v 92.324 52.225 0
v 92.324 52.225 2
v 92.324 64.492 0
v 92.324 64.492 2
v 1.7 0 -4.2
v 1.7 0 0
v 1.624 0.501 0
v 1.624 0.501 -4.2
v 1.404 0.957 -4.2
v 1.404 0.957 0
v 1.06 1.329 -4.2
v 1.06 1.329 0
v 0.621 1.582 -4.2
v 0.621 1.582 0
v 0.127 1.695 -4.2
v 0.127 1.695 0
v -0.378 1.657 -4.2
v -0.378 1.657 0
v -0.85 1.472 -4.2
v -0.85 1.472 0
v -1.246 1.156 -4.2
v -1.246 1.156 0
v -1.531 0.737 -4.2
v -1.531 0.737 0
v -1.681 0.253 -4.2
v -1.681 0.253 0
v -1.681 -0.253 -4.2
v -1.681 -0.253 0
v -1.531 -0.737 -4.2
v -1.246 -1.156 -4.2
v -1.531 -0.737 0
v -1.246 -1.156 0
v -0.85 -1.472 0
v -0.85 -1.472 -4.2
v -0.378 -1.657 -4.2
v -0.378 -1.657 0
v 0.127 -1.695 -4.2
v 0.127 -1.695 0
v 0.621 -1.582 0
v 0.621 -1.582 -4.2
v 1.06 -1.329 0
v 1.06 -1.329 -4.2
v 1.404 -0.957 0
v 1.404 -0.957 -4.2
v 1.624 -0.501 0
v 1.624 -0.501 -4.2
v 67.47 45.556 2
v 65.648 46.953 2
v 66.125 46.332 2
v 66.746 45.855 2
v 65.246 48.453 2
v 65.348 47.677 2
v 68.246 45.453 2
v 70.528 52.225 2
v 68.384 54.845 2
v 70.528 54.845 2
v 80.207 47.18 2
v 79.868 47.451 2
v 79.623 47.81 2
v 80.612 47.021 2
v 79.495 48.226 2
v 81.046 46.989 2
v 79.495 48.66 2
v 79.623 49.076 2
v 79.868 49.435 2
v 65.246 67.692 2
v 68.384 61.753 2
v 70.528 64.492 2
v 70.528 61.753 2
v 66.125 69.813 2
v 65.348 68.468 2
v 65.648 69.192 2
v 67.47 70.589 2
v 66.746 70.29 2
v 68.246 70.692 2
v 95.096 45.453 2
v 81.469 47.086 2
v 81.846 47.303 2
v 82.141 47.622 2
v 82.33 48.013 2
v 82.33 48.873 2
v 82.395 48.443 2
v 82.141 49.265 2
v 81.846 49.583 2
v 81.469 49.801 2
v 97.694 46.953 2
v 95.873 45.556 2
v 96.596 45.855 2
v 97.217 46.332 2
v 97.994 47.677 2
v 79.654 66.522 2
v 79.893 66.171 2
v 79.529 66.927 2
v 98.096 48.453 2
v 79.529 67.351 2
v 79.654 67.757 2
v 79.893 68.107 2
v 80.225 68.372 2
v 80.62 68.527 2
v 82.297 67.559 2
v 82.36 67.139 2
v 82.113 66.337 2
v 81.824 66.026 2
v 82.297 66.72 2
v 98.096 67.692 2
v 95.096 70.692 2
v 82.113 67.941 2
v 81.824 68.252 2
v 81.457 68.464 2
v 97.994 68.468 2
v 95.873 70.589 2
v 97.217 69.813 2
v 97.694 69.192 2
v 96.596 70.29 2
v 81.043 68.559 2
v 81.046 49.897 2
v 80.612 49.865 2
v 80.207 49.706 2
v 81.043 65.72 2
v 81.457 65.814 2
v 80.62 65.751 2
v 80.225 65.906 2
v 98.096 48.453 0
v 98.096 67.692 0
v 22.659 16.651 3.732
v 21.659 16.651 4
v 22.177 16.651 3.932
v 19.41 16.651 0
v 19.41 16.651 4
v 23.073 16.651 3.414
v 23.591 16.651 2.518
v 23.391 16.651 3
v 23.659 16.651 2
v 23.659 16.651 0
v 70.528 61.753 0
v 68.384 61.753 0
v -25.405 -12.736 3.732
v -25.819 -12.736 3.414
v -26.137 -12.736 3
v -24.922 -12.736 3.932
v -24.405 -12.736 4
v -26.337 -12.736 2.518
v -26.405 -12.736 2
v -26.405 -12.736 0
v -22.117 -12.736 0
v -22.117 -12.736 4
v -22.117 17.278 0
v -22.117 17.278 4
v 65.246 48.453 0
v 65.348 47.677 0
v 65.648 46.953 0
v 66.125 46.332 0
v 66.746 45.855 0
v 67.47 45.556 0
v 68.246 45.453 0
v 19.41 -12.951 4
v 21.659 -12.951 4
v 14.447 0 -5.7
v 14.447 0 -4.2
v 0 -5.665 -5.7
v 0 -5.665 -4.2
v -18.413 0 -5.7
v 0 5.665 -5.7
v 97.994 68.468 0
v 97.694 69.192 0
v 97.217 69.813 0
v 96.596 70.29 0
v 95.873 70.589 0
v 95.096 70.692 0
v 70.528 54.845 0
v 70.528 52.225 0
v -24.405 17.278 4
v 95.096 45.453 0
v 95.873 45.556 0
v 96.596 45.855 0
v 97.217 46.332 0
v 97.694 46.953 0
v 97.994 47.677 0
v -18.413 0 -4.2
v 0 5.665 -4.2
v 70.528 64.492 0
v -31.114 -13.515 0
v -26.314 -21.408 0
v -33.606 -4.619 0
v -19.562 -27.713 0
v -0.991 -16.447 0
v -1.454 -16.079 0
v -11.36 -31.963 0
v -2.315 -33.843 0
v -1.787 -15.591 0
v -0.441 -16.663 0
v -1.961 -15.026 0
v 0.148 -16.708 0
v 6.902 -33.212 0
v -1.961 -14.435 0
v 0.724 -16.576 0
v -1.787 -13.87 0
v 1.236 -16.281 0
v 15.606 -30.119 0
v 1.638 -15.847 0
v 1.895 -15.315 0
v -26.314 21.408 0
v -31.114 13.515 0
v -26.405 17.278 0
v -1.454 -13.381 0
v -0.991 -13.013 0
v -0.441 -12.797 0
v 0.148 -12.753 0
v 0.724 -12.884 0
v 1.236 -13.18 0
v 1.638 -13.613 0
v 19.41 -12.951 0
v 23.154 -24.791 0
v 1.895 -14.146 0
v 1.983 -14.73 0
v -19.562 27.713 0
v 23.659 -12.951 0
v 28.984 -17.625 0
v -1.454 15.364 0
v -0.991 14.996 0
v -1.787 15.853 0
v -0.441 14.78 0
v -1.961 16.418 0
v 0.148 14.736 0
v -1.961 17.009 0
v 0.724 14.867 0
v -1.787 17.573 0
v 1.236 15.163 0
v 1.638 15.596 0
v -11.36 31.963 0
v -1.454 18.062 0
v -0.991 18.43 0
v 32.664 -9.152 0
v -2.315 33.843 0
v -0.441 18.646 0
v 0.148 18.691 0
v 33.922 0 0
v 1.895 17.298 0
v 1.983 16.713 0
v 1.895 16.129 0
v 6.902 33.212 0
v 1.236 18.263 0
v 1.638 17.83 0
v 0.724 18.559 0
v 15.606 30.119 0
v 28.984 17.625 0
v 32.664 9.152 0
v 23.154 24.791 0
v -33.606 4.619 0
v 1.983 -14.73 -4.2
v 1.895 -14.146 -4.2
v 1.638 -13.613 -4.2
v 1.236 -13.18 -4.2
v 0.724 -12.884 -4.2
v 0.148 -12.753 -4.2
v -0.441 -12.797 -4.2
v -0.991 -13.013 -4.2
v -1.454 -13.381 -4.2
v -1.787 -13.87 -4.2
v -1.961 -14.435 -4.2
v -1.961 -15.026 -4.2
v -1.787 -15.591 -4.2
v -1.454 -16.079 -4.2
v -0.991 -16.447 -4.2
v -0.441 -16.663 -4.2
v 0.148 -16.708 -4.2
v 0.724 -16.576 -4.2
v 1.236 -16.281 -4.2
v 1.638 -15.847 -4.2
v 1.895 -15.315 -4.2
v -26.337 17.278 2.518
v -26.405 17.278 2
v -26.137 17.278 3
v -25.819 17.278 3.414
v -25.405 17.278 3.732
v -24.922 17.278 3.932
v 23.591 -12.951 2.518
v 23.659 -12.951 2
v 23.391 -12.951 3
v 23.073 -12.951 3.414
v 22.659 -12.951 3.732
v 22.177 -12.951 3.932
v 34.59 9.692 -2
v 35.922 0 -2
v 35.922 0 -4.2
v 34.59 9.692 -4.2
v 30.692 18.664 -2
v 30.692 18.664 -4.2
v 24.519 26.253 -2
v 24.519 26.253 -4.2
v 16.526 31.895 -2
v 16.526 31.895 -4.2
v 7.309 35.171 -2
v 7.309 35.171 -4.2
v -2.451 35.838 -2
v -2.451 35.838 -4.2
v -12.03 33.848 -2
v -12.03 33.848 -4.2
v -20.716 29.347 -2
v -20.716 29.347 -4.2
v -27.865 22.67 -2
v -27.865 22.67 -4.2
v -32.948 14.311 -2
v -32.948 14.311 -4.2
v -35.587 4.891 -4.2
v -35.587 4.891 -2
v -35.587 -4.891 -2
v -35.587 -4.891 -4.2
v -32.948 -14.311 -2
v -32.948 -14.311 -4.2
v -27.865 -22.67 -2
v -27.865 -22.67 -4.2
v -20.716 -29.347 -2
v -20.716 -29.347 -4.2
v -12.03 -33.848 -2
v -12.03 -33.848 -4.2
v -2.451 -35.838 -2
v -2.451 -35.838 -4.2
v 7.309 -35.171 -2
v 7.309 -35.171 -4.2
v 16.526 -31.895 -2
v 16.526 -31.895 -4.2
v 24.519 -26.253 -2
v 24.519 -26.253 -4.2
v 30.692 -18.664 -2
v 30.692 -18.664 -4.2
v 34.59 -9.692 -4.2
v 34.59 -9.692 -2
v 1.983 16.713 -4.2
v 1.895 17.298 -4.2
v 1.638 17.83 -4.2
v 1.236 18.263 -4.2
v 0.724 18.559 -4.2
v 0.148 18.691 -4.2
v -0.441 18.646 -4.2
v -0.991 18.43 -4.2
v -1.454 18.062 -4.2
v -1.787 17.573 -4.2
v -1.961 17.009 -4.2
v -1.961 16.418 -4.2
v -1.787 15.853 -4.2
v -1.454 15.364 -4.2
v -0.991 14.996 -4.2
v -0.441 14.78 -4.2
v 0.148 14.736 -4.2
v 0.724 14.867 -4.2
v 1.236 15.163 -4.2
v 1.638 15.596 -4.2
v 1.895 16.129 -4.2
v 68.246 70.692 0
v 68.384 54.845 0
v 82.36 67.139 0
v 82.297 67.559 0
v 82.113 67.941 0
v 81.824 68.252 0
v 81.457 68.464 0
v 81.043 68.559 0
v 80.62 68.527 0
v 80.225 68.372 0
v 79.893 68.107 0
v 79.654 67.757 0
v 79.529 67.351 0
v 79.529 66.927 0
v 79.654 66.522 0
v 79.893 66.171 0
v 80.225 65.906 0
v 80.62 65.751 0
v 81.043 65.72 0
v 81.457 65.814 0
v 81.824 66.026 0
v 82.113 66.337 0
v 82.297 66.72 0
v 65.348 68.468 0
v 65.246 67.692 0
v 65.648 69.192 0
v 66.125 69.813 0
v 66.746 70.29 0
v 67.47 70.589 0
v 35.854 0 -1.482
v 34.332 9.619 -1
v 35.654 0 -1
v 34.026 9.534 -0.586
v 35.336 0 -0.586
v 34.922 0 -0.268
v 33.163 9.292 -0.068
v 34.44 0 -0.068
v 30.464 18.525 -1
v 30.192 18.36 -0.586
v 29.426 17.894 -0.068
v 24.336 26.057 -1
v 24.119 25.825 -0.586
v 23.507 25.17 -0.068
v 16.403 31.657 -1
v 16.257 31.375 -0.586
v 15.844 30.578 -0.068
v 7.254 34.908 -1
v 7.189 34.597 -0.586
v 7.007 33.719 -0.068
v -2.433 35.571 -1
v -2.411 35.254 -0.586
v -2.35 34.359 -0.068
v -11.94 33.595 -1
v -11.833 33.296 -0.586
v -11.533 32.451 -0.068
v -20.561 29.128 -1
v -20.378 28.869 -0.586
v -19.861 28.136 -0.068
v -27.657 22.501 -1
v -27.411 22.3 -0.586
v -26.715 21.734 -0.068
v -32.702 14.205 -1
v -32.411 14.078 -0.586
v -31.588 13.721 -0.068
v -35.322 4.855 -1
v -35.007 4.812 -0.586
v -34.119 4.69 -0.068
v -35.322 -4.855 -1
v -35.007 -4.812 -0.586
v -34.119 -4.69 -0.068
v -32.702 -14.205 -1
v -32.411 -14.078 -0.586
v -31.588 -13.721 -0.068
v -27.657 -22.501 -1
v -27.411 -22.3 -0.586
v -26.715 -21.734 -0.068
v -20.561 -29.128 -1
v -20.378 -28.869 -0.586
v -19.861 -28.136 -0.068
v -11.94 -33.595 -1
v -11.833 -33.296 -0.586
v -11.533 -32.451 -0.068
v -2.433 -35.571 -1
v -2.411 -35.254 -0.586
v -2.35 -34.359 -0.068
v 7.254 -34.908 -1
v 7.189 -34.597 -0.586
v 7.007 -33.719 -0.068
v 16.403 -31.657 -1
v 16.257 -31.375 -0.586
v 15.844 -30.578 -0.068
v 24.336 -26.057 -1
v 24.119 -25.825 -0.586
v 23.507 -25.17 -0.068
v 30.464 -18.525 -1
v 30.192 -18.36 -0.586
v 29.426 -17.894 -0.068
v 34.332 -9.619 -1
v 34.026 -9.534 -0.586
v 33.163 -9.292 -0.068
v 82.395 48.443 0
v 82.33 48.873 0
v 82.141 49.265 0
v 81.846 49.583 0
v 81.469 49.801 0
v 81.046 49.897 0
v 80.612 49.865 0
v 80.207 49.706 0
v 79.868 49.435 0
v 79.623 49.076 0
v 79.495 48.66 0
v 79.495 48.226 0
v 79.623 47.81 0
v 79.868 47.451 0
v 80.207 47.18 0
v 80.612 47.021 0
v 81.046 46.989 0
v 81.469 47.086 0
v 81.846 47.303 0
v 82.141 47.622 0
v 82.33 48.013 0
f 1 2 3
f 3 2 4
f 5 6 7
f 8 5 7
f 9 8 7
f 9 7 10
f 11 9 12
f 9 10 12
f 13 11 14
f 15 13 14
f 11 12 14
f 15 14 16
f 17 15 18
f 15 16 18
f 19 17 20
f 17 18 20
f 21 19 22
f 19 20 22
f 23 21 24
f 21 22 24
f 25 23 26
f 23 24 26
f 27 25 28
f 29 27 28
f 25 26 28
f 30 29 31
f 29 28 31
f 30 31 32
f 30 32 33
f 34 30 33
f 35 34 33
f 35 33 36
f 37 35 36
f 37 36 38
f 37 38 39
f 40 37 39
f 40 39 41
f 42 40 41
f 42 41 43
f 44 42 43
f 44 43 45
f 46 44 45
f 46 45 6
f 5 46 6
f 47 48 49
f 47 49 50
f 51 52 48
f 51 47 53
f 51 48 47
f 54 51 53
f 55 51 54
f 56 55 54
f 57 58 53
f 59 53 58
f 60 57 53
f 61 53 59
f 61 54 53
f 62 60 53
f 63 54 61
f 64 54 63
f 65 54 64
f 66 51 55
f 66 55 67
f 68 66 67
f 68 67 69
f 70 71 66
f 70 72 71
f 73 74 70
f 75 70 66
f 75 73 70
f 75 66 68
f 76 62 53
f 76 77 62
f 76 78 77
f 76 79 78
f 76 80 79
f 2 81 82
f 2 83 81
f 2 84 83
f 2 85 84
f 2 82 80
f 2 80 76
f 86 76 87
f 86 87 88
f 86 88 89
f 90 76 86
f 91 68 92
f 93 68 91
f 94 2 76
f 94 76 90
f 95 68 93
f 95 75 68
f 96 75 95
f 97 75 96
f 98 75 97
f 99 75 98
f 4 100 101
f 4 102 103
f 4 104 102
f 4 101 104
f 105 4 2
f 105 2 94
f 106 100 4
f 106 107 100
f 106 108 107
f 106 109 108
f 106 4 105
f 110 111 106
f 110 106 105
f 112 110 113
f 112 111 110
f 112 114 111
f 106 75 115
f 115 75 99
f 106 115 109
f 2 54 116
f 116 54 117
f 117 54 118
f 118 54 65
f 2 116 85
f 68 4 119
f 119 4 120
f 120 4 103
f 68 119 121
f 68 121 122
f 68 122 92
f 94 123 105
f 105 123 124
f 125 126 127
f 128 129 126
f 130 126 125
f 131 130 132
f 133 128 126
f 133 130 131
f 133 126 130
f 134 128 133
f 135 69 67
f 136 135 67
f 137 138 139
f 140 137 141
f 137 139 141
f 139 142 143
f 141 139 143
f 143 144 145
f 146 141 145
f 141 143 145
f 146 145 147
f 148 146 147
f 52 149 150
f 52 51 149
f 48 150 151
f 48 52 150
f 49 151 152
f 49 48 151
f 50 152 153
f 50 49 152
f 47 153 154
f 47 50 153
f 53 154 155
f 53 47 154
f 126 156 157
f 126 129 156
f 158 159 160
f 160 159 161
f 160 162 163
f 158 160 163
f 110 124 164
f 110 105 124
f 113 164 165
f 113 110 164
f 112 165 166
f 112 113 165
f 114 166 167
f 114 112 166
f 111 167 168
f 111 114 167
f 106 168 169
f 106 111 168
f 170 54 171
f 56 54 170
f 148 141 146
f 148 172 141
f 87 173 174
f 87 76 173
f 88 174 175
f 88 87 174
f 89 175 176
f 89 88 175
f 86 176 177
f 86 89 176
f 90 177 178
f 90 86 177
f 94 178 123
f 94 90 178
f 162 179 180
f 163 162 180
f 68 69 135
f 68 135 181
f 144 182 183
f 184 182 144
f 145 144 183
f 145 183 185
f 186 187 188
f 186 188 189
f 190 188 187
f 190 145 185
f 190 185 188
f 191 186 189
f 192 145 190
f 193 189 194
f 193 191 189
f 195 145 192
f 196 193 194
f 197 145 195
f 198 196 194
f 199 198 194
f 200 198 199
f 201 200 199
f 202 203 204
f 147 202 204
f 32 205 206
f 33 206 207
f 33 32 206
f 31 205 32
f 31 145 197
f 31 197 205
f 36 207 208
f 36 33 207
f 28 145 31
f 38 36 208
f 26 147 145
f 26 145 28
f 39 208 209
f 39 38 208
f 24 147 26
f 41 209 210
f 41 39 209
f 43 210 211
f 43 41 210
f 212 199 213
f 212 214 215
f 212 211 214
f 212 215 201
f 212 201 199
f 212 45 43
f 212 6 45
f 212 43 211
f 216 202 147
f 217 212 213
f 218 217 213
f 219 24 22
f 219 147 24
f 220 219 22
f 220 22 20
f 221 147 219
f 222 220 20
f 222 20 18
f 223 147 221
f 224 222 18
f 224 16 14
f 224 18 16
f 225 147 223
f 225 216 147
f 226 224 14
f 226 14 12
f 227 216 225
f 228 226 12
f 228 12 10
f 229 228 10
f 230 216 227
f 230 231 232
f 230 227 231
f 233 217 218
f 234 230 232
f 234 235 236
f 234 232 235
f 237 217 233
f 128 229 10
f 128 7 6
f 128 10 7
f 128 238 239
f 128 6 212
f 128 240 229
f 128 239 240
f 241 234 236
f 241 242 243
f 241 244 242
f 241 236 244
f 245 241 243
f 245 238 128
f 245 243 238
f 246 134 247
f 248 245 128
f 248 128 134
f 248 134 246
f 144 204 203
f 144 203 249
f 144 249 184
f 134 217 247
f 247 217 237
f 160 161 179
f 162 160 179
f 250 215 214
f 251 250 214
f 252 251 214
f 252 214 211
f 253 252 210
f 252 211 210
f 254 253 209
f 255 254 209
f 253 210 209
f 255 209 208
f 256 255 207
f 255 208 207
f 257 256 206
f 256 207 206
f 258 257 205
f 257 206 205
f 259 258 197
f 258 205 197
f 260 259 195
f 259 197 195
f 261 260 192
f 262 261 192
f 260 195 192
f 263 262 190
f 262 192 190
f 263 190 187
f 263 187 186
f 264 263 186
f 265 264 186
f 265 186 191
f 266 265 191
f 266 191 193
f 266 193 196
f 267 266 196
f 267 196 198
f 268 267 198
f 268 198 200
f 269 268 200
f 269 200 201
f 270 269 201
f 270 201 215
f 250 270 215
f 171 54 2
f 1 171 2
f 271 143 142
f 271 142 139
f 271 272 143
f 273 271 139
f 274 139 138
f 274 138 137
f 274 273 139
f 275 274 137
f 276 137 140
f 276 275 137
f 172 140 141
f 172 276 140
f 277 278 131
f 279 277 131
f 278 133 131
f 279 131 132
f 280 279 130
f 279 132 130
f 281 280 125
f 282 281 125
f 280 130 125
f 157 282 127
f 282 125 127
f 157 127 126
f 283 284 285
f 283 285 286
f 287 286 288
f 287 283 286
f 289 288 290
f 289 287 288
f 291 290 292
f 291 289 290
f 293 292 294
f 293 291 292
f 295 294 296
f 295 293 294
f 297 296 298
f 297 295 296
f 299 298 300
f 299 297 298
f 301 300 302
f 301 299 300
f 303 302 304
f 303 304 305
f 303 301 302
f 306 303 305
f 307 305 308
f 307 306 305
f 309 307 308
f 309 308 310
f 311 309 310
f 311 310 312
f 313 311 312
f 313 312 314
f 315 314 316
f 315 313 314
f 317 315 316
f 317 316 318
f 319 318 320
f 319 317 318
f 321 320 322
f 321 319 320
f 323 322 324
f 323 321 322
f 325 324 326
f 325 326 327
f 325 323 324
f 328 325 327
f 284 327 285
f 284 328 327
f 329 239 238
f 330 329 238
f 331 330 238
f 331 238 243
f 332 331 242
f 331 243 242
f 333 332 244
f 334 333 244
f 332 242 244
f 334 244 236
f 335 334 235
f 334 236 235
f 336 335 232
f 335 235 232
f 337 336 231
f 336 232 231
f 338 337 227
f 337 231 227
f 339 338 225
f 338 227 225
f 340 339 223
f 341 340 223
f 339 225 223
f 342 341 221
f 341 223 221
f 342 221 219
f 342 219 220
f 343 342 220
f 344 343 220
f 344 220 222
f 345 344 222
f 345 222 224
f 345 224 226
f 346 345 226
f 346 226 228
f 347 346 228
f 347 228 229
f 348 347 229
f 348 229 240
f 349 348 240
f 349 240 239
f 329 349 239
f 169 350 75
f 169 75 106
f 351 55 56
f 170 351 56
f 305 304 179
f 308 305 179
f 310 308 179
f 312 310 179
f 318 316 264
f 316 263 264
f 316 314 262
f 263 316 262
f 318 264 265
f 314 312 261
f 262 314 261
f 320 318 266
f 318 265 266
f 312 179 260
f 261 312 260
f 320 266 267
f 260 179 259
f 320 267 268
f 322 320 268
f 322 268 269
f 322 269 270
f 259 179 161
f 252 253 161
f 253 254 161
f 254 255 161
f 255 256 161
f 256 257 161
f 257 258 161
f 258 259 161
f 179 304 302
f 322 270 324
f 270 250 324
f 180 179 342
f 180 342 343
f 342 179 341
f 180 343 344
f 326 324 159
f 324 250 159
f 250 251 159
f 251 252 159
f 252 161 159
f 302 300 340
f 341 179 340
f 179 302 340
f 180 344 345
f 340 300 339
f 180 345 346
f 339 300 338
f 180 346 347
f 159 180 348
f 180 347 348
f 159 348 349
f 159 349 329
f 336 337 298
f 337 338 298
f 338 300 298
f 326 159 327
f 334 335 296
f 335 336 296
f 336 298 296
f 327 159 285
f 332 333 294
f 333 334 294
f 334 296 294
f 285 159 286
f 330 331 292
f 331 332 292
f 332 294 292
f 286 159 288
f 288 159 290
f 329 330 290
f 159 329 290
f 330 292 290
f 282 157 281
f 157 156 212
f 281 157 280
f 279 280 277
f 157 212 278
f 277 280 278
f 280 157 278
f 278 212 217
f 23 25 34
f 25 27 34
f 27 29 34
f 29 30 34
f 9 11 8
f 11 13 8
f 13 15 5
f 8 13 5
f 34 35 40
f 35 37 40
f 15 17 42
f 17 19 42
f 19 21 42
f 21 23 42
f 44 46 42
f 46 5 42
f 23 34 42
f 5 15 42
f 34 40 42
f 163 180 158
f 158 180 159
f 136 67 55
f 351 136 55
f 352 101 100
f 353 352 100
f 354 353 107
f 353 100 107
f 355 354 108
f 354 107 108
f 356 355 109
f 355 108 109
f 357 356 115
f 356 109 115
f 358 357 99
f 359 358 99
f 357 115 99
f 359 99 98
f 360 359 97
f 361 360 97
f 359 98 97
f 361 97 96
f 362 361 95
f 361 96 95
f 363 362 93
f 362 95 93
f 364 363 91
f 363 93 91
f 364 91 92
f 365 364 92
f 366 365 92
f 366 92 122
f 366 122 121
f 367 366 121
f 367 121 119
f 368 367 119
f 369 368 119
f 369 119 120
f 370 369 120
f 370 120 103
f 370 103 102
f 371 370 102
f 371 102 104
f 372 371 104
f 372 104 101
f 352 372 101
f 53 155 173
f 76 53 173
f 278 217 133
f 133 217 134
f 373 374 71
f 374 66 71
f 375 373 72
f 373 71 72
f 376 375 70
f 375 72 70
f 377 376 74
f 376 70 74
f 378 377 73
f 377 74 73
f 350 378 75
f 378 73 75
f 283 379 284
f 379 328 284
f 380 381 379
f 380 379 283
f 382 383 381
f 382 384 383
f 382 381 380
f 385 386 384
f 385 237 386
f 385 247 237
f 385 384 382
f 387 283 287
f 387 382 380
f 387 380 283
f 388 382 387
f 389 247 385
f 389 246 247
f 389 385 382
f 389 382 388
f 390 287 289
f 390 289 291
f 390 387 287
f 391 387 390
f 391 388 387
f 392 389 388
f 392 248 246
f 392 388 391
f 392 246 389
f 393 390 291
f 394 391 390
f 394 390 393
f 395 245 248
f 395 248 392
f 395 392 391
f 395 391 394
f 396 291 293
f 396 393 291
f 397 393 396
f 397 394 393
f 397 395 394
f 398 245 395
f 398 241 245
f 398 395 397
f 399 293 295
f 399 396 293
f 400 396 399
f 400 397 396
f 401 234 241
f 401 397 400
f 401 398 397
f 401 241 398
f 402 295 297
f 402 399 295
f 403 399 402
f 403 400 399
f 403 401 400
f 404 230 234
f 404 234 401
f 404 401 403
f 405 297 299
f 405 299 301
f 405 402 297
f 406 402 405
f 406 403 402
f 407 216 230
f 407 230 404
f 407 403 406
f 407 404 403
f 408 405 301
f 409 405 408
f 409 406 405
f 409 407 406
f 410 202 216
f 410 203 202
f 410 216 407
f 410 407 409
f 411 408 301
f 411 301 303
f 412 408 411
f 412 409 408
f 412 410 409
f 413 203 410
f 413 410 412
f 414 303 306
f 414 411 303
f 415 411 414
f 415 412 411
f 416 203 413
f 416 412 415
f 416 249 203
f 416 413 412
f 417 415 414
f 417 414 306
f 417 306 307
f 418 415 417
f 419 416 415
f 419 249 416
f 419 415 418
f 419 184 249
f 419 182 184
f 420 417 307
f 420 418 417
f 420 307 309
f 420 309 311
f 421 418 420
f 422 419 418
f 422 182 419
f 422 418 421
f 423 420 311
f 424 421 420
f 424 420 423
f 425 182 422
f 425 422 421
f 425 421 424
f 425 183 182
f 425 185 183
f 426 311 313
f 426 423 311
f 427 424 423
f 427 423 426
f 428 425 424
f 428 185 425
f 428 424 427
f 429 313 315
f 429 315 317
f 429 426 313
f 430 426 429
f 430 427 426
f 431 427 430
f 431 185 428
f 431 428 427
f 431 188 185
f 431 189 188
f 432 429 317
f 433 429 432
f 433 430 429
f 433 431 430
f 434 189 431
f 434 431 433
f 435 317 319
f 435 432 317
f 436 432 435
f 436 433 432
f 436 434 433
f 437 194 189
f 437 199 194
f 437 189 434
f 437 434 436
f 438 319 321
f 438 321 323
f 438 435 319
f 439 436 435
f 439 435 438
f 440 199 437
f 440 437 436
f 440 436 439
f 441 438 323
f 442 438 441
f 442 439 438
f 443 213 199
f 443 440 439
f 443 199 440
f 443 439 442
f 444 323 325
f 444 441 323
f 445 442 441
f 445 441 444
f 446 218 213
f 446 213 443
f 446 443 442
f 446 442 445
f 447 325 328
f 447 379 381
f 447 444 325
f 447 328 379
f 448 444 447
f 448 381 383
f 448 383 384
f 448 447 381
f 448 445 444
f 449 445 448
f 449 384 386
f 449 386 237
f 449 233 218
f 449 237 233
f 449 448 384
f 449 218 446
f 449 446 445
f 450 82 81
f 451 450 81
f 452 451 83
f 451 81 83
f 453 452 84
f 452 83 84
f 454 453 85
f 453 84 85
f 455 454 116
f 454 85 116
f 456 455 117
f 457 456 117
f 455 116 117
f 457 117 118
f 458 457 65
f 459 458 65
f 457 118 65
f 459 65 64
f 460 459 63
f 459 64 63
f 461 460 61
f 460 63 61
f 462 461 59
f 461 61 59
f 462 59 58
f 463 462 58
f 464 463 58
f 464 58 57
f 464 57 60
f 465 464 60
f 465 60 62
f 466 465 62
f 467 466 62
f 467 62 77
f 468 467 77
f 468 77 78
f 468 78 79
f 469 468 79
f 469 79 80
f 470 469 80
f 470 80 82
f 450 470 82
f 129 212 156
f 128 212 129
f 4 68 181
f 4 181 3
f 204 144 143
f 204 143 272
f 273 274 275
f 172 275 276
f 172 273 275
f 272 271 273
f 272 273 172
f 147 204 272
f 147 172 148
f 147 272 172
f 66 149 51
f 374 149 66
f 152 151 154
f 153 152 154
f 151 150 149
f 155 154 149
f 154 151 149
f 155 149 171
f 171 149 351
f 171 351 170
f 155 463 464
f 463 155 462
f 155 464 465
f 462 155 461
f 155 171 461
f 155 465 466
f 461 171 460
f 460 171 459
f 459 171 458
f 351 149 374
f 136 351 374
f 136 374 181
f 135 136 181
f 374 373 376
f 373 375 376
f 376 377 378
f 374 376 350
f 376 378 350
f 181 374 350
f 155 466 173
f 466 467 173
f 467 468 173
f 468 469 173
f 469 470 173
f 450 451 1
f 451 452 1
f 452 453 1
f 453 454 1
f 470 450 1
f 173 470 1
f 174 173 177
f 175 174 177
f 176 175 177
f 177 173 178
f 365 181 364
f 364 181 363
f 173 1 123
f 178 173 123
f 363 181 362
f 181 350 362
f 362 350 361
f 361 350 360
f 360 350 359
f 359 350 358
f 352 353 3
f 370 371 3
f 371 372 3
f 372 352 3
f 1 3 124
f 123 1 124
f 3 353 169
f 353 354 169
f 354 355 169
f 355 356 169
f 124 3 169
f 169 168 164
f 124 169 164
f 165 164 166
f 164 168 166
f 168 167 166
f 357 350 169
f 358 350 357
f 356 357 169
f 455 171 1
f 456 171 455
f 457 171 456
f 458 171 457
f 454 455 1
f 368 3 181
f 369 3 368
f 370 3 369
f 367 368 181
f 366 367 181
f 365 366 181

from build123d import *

# Parameters (mm, degrees)
F0_R      = 35.922
F1_DEPTH  = 4.2
F2_R      = 2
F3_R      = 1.699641
F5_R      = 1.982914
F5_R_2    = 1.982915
F6_DEPTH  = 25
F8_W      = 4.287663
F8_H      = 30.013652
F7_W      = 4.2491
F7_H      = 29.60207
F9_DEPTH  = 4
F10_R     = 2
F11_R     = 2
F14_DEPTH = 1.5
F15_W     = 32.849945
F15_H     = 25.238373
F16_DEPTH = 2
F17_R     = 3
F19_W     = 21.795623
F19_H     = 12.267485
F21_DEPTH = 25
F22_R     = 1.423427
F22_R_2   = 1.45824
F23_DEPTH = 25


with BuildPart() as f1:
    # F0 (on Top) → F1 (new body)
    with BuildSketch(Plane.XY):
        Circle(F0_R)
    extrude(amount=-F1_DEPTH)

    # F2
    f2_edges = [f1.edges().sort_by_distance(p)[0] for p in [
        (-35.922, 0, 0),
    ]]
    fillet(f2_edges, radius=F2_R)

    # F3 (on face) + F5 (on face) → F6 (cut)
    with BuildSketch(Plane.XY):
        Circle(F3_R)
    with BuildSketch(Plane.XY):
        with Locations((0, 16.713131)):
            Circle(F5_R)
        with Locations((0, -14.730216)):
            Circle(F5_R_2)
    extrude(amount=-F6_DEPTH, mode=Mode.SUBTRACT)

    # F8 (on face) + F7 (on face) → F9 (join)
    with BuildSketch(Plane.XY):
        with Locations((-24.261015, 2.270942)):
            Rectangle(F8_W, F8_H)
    with BuildSketch(Plane.XY):
        with Locations((21.534551, 1.849685)):
            Rectangle(F7_W, F7_H)
    extrude(amount=F9_DEPTH)

    # F10
    f10_edges = [f1.edges().sort_by_distance(p)[0] for p in [
        (-26.404846, 2.270942, 4),
    ]]
    fillet(f10_edges, radius=F10_R)

    # F11
    f11_edges = [f1.edges().sort_by_distance(p)[0] for p in [
        (23.659101, 1.849685, 4),
    ]]
    fillet(f11_edges, radius=F11_R)

    # F13 (on face) → F14 (join)
    with BuildSketch(Plane(origin=(0, 0, -4.2), x_dir=(1, 0, 0), z_dir=(0, 0, -1))):
        Polygon((0, 5.665469), (-18.412771, 0), (0, -5.665468), (14.446942, 0), align=None)
    extrude(amount=F14_DEPTH)


with BuildPart() as f16:
    # F15 (on Top) → F16 (new body)
    with BuildSketch(Plane.XY):
        with Locations((81.671086, 58.072503)):
            Rectangle(F15_W, F15_H)
    extrude(amount=F16_DEPTH)

    # F17
    f17_edges = [f16.edges().sort_by_distance(p)[0] for p in [
        (65.246113, 70.69169, 1),
        (98.096058, 45.453317, 1),
        (98.096058, 70.69169, 1),
        (65.246113, 45.453317, 1),
    ]]
    fillet(f17_edges, radius=F17_R)

    # F19 (on face) + F20 (on face) → F21 (cut)
    with BuildSketch(Plane.XY.offset(2)):
        with Locations((81.426006, 58.358453)):
            Rectangle(F19_W, F19_H)
    with BuildSketch(Plane.XY.offset(2)):
        Polygon((71.600109, 54.844953), (71.600109, 61.752856), (68.384357, 61.752856), (68.384357, 57.226986), (68.384357, 54.844953), align=None)
    extrude(amount=-F21_DEPTH, mode=Mode.SUBTRACT)

    # F22 (on face) → F23 (cut)
    with BuildSketch(Plane.XY.offset(2)):
        with Locations((80.936566, 67.139201)):
            Circle(F22_R)
        with Locations((80.936566, 48.443154)):
            Circle(F22_R_2)
    extrude(amount=-F23_DEPTH, mode=Mode.SUBTRACT)


solid = Compound([f1.part, f16.part])
